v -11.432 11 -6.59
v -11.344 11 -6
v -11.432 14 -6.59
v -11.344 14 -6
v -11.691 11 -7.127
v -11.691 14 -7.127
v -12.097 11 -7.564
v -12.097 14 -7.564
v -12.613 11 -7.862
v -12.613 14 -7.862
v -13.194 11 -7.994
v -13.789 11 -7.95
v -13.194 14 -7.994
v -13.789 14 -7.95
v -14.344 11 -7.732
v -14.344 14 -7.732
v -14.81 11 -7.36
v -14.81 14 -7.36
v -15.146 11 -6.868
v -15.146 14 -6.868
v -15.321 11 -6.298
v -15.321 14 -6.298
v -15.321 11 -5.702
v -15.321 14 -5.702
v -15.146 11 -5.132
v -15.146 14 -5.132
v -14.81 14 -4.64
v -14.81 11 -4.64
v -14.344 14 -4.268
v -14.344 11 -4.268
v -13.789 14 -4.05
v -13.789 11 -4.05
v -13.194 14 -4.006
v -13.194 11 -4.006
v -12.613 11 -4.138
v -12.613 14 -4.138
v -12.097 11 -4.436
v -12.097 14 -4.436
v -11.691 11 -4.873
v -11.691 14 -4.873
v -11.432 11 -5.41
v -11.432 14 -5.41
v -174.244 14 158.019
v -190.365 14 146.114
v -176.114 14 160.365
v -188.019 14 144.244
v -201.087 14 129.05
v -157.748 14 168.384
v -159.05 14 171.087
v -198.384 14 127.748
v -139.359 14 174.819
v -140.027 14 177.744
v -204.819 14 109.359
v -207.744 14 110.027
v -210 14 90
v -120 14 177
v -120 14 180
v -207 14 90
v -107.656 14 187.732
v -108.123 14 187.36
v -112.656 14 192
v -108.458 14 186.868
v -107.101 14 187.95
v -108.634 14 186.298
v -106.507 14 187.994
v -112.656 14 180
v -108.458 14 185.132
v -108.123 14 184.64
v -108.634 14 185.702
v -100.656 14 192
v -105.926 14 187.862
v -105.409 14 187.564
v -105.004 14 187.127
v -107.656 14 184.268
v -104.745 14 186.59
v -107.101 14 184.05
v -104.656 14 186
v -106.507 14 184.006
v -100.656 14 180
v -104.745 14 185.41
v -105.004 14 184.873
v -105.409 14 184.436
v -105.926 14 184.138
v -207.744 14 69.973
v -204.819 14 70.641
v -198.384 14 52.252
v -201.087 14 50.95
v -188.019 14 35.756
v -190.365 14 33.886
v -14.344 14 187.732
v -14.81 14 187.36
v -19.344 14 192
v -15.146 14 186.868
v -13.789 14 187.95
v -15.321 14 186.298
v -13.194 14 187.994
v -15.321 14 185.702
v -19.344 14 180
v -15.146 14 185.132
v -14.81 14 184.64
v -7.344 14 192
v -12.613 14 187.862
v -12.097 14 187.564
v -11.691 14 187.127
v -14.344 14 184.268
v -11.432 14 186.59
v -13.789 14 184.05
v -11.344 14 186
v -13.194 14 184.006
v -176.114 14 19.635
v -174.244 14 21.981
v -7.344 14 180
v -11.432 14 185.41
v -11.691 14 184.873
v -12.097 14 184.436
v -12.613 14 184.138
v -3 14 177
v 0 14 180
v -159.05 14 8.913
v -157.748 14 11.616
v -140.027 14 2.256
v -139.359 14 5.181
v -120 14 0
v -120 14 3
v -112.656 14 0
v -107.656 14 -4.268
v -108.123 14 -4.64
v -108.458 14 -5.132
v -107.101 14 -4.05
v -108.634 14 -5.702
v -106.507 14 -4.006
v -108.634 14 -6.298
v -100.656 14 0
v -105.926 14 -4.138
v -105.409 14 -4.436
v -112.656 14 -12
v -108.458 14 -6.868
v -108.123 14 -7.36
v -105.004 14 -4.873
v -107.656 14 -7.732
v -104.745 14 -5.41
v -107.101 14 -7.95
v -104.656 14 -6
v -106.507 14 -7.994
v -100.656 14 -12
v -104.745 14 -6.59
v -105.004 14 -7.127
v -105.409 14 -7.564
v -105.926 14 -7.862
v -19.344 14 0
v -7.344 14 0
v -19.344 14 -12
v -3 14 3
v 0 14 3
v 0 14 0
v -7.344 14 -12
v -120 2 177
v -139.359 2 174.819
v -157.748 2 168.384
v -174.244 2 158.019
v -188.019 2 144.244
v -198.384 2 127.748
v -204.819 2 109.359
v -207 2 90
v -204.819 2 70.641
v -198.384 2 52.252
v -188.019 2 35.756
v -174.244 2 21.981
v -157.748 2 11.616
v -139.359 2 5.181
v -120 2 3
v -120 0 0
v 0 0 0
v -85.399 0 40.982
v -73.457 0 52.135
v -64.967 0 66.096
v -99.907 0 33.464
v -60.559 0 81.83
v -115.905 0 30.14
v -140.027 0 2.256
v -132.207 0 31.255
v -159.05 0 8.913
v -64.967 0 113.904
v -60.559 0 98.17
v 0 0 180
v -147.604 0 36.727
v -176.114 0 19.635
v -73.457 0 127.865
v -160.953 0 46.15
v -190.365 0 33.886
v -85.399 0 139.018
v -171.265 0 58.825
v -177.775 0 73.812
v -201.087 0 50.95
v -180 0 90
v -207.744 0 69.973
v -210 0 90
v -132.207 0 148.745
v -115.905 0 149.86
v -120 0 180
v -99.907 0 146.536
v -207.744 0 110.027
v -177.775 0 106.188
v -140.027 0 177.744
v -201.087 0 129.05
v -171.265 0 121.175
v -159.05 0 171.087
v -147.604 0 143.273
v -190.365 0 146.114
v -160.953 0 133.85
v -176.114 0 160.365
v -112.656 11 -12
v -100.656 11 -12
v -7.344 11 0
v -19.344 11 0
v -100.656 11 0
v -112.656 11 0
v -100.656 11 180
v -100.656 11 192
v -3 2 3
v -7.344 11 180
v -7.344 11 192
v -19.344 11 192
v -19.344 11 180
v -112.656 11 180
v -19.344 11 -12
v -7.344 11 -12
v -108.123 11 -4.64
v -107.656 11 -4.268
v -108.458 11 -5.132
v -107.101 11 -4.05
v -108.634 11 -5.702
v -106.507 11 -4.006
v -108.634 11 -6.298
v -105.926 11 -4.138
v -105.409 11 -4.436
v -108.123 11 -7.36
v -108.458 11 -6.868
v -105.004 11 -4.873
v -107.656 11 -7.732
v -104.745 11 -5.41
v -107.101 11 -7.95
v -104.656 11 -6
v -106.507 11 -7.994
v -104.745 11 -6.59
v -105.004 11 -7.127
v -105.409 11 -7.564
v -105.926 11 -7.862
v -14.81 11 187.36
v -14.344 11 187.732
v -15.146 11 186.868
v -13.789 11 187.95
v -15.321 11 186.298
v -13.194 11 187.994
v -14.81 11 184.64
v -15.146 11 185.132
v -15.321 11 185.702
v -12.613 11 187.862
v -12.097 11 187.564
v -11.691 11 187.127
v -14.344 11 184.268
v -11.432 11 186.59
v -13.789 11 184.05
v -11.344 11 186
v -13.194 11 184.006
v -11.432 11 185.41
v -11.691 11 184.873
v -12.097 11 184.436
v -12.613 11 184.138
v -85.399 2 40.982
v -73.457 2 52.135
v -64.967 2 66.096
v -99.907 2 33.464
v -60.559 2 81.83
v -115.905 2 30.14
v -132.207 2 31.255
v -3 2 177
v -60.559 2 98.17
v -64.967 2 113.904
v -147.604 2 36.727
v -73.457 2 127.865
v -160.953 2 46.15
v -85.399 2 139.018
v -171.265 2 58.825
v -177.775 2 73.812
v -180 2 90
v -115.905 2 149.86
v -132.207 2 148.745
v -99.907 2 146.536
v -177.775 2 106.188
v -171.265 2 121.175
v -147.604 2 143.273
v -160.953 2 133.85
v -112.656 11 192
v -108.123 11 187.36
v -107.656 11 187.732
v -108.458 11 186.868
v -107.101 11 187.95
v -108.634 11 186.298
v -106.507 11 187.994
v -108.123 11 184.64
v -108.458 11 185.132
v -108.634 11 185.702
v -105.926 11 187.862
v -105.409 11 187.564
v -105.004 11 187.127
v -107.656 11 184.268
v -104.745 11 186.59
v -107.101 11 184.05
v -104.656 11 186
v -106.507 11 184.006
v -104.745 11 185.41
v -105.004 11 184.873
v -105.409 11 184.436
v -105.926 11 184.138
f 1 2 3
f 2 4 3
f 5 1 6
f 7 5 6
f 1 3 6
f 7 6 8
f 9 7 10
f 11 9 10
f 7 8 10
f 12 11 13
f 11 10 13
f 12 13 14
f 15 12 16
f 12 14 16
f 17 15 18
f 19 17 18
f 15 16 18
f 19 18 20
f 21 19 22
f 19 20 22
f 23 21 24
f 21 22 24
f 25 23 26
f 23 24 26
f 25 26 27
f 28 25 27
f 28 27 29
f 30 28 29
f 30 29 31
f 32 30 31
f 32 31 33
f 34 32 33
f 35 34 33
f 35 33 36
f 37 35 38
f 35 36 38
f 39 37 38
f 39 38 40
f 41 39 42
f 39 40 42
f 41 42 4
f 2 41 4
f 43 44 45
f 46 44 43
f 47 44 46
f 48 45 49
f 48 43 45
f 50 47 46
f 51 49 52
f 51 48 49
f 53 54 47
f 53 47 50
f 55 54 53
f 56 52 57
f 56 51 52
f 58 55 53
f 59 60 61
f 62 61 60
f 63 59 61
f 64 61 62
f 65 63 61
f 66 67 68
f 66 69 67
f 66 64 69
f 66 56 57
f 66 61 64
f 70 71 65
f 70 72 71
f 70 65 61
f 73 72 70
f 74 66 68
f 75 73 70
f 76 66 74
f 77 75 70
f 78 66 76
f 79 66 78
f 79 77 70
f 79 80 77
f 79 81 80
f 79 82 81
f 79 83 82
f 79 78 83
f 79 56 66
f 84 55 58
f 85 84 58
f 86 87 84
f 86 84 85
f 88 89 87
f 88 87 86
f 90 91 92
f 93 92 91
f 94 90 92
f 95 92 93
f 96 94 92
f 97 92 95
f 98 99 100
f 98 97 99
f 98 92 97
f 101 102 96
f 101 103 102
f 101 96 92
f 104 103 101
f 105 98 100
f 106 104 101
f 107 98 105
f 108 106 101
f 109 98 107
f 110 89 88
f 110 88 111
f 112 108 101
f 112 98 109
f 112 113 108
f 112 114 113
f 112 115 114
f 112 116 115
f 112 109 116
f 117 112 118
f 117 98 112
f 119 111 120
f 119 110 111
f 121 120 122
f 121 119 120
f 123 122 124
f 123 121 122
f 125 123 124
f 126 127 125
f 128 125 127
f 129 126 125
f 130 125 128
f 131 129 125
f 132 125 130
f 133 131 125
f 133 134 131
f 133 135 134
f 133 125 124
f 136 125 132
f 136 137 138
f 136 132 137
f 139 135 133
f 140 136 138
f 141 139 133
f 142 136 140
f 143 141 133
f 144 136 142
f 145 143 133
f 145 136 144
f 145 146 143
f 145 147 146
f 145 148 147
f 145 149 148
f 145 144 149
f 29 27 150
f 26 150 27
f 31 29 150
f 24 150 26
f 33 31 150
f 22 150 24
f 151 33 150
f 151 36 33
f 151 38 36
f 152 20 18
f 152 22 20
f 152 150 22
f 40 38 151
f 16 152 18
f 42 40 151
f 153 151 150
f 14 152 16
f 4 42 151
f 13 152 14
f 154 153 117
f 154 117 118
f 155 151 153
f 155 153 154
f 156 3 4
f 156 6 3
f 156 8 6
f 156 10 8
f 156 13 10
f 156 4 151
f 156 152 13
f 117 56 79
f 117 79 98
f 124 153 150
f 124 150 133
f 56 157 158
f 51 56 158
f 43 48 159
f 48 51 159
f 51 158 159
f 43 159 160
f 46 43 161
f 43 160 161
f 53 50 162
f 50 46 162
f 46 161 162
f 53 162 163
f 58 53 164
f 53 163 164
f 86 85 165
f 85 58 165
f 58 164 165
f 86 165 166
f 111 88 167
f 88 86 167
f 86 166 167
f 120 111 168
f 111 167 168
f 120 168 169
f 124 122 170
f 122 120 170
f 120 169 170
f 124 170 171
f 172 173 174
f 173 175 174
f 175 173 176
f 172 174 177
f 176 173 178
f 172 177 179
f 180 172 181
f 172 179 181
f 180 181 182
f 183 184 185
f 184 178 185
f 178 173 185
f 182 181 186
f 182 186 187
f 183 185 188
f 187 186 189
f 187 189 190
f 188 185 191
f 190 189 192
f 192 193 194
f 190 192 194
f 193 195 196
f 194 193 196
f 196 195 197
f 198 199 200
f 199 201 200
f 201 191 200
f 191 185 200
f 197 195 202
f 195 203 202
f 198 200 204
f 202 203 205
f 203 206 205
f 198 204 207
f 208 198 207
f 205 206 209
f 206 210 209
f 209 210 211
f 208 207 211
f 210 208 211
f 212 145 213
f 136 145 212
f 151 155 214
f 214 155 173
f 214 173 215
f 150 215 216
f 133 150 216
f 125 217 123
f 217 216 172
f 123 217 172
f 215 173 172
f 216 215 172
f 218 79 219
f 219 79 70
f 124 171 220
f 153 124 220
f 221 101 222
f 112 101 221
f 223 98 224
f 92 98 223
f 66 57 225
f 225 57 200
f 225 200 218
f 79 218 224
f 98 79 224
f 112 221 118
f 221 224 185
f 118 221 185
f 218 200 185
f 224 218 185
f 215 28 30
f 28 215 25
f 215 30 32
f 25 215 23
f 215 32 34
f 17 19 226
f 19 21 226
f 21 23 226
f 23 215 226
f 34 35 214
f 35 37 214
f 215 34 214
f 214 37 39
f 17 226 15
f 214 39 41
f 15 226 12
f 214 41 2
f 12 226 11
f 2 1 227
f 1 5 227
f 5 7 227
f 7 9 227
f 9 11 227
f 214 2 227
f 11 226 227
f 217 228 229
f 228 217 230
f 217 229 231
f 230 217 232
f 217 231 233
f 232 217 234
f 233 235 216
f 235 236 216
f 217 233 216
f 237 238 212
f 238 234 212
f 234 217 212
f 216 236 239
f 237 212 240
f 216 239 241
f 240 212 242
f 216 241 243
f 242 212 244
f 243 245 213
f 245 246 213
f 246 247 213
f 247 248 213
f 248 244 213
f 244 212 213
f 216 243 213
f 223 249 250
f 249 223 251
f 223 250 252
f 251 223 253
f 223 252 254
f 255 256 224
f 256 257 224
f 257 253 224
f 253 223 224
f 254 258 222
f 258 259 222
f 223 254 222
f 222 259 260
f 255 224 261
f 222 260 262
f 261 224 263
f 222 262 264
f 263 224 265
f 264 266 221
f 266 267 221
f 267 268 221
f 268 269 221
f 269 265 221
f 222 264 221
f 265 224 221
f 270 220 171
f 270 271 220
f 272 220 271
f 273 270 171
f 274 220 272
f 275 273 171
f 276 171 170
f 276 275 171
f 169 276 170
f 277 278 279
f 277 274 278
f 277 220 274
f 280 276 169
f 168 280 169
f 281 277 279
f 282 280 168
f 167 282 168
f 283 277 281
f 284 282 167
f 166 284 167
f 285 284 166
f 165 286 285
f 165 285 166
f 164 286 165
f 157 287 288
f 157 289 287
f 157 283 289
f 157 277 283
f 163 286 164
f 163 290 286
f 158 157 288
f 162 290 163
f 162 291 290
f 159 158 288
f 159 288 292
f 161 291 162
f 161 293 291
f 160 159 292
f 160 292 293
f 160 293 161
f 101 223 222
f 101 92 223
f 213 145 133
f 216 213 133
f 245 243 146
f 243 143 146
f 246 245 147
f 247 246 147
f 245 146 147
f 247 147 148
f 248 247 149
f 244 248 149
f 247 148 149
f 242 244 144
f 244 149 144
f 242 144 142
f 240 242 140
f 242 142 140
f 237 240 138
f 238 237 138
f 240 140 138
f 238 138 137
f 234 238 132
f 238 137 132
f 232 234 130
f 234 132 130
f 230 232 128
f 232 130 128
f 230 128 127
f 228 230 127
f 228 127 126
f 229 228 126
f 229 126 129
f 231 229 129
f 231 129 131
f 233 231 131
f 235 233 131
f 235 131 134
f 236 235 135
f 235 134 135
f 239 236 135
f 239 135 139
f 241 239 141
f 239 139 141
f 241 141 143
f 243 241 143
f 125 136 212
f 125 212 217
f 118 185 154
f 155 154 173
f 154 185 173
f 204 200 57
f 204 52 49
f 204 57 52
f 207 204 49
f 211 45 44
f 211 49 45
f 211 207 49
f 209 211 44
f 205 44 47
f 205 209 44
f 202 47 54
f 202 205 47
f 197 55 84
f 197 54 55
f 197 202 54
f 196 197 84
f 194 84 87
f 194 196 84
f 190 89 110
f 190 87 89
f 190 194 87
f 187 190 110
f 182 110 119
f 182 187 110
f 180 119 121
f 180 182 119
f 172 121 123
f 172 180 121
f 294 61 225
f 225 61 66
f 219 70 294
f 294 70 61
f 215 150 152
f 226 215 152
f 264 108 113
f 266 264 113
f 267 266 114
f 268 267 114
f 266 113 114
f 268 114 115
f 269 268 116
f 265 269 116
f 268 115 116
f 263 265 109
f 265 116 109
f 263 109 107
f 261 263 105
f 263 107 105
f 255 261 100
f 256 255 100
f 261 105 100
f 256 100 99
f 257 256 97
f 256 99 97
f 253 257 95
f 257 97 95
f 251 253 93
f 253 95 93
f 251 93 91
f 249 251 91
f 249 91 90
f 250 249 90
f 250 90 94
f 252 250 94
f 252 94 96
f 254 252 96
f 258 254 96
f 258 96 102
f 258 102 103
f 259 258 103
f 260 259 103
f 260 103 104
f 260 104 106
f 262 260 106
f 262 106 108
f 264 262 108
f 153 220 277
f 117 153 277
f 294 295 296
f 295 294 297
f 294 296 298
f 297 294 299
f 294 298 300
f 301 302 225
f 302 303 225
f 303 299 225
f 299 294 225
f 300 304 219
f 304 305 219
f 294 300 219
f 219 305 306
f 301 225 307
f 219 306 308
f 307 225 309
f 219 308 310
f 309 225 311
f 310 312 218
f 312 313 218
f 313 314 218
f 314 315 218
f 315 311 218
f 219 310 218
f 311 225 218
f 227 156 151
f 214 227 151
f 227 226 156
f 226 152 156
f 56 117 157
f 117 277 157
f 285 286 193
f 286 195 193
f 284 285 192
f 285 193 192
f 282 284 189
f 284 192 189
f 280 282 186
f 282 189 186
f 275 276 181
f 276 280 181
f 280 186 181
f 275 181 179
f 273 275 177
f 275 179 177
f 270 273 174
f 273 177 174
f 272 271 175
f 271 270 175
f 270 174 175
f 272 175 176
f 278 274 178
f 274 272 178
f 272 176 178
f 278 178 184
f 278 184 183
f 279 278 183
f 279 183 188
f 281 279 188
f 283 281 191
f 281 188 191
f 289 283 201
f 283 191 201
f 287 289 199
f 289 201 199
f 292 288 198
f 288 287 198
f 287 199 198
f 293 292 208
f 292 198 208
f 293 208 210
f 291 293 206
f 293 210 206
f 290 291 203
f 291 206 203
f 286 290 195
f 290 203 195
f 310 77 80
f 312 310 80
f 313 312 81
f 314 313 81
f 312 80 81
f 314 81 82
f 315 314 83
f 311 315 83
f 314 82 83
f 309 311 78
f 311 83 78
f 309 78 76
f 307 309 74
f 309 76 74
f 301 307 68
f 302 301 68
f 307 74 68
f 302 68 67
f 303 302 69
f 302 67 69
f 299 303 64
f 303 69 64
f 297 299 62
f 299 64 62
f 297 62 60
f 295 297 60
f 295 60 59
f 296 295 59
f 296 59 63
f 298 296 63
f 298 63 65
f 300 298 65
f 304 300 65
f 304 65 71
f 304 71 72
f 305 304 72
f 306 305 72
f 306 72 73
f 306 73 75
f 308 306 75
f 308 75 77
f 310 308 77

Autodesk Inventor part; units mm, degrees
ref_plane "YZ Plane" through (0, 0, 0) normal (1, 0, 0) x (0, 1, 0)
ref_plane "XZ Plane" through (0, 0, 0) normal (0, 1, 0) x (-1, 0, 0)
ref_plane "XY Plane" through (0, 0, 0) normal (0, 0, 1) x (1, 0, 0)
sketch "Esquisse1" plane through (0, 0, 0) normal (0, 1, 0) x (-1, 0, 0)
  line L0 (0, 0) -> (120, 0)
  line L1 (120, 180) -> (0, 180)
  line L2 (0, 180) -> (0, 0)
  arc A0 (120, 0) -> (120, 180) centre (120, 90) ccw
  circle A1 centre (120, 90) radius 60
  line L3 (120, 177) -> (3, 177)
  line L4 (3, 177) -> (3, 3)
  line L5 (3, 3) -> (120, 3)
  arc A2 (120, 3) -> (120, 177) centre (120, 90) ccw
  dimension "d2" = 120
  dimension "d3" = 120
  dimension "d4" = 180
  dimension "d5" = 3
extrude "Extrusion1" add sketch "Esquisse1" along normal blind 2 contours L2 L1 A0 L0 | A2 L5 L4 L3
sketch "Esquisse2" plane through (0, 2, 0) normal (0, 1, 0) x (1, 0, 0)
  arc A0 (-120, 0) -> (-120, -180) centre (-120, -90) ccw projected
  arc A1 (-120, 0) -> (-120, -180) centre (-120, -90) ccw
  line L0 (-120, -180) -> (0, -180) projected
  line L1 (-120, -180) -> (0, -180)
  line L2 (0, -180) -> (0, 0)
  line L3 (0, 0) -> (-120, 0) projected
  line L4 (0, 0) -> (-120, 0)
  arc A2 (-120, -3) -> (-120, -177) centre (-120, -90) ccw
  line L5 (-120, -3) -> (0, -3)
  line L6 (-3, -3) -> (-3, -177)
  line L7 (-3, -177) -> (-120, -177)
  arc A3 (-120, -3) -> (-120, -177) centre (-120, -90) ccw
  line L8 (-120, -3) -> (-3, -3)
  dimension "d8" = 3
  dimension "d9" = 90
  dimension "d10" = 3
extrude "Extrusion2" add sketch "Esquisse2" along normal blind 12
sketch "Esquisse3" plane through (0, 14, 0) normal (0, 1, 0) x (1, 0, 0)
  line L0 (-120, -180) -> (0, -180) projected
  line L1 (-7.3436, -180) -> (-19.3436, -180)
  line L2 (-19.3436, -180) -> (-19.3436, -192)
  line L3 (-19.3436, -192) -> (-7.3436, -192)
  line L4 (-7.3436, -192) -> (-7.3436, -180)
  circle A0 centre (-13.3436, -186) radius 2
  circle A1 centre (-120, -90) radius 60 projected
  line L5 (-120, -90) -> (-228.3107, -90)
  line L6 (-19.3436, 0) -> (-19.3436, 12)
  line L7 (-19.3436, 12) -> (-7.3436, 12)
  line L8 (-7.3436, 12) -> (-7.3436, 0)
  circle A2 centre (-13.3436, 6) radius 2
  line L9 (-60, -180) -> (-60, 26.6941)
  line L10 (-112.6564, -180) -> (-100.6564, -180)
  line L11 (-100.6564, -180) -> (-100.6564, -192)
  line L12 (-100.6564, -192) -> (-112.6564, -192)
  line L13 (-112.6564, -192) -> (-112.6564, -180)
  circle A3 centre (-106.6564, -186) radius 2
  line L14 (-100.6564, 12) -> (-112.6564, 12)
  line L15 (-112.6564, 12) -> (-112.6564, 0)
  circle A4 centre (-106.6564, 6) radius 2
  line L16 (-100.6564, 12) -> (-100.6564, 0)
  line L17 (0, 0) -> (-120, 0) projected
  line L18 (-7.3436, 0) -> (-19.3436, 0)
  dimension "d13" = 12
  dimension "d14" = 12
  dimension "d15" = 4
extrude "Extrusion3" add sketch "Esquisse3" against normal blind 3 contours L17 L15 L14 L16 | L6 L7 L8 L17 | L0 L4 L3 L2 | L0 L11 L12 L13
properties part number "Socle"
